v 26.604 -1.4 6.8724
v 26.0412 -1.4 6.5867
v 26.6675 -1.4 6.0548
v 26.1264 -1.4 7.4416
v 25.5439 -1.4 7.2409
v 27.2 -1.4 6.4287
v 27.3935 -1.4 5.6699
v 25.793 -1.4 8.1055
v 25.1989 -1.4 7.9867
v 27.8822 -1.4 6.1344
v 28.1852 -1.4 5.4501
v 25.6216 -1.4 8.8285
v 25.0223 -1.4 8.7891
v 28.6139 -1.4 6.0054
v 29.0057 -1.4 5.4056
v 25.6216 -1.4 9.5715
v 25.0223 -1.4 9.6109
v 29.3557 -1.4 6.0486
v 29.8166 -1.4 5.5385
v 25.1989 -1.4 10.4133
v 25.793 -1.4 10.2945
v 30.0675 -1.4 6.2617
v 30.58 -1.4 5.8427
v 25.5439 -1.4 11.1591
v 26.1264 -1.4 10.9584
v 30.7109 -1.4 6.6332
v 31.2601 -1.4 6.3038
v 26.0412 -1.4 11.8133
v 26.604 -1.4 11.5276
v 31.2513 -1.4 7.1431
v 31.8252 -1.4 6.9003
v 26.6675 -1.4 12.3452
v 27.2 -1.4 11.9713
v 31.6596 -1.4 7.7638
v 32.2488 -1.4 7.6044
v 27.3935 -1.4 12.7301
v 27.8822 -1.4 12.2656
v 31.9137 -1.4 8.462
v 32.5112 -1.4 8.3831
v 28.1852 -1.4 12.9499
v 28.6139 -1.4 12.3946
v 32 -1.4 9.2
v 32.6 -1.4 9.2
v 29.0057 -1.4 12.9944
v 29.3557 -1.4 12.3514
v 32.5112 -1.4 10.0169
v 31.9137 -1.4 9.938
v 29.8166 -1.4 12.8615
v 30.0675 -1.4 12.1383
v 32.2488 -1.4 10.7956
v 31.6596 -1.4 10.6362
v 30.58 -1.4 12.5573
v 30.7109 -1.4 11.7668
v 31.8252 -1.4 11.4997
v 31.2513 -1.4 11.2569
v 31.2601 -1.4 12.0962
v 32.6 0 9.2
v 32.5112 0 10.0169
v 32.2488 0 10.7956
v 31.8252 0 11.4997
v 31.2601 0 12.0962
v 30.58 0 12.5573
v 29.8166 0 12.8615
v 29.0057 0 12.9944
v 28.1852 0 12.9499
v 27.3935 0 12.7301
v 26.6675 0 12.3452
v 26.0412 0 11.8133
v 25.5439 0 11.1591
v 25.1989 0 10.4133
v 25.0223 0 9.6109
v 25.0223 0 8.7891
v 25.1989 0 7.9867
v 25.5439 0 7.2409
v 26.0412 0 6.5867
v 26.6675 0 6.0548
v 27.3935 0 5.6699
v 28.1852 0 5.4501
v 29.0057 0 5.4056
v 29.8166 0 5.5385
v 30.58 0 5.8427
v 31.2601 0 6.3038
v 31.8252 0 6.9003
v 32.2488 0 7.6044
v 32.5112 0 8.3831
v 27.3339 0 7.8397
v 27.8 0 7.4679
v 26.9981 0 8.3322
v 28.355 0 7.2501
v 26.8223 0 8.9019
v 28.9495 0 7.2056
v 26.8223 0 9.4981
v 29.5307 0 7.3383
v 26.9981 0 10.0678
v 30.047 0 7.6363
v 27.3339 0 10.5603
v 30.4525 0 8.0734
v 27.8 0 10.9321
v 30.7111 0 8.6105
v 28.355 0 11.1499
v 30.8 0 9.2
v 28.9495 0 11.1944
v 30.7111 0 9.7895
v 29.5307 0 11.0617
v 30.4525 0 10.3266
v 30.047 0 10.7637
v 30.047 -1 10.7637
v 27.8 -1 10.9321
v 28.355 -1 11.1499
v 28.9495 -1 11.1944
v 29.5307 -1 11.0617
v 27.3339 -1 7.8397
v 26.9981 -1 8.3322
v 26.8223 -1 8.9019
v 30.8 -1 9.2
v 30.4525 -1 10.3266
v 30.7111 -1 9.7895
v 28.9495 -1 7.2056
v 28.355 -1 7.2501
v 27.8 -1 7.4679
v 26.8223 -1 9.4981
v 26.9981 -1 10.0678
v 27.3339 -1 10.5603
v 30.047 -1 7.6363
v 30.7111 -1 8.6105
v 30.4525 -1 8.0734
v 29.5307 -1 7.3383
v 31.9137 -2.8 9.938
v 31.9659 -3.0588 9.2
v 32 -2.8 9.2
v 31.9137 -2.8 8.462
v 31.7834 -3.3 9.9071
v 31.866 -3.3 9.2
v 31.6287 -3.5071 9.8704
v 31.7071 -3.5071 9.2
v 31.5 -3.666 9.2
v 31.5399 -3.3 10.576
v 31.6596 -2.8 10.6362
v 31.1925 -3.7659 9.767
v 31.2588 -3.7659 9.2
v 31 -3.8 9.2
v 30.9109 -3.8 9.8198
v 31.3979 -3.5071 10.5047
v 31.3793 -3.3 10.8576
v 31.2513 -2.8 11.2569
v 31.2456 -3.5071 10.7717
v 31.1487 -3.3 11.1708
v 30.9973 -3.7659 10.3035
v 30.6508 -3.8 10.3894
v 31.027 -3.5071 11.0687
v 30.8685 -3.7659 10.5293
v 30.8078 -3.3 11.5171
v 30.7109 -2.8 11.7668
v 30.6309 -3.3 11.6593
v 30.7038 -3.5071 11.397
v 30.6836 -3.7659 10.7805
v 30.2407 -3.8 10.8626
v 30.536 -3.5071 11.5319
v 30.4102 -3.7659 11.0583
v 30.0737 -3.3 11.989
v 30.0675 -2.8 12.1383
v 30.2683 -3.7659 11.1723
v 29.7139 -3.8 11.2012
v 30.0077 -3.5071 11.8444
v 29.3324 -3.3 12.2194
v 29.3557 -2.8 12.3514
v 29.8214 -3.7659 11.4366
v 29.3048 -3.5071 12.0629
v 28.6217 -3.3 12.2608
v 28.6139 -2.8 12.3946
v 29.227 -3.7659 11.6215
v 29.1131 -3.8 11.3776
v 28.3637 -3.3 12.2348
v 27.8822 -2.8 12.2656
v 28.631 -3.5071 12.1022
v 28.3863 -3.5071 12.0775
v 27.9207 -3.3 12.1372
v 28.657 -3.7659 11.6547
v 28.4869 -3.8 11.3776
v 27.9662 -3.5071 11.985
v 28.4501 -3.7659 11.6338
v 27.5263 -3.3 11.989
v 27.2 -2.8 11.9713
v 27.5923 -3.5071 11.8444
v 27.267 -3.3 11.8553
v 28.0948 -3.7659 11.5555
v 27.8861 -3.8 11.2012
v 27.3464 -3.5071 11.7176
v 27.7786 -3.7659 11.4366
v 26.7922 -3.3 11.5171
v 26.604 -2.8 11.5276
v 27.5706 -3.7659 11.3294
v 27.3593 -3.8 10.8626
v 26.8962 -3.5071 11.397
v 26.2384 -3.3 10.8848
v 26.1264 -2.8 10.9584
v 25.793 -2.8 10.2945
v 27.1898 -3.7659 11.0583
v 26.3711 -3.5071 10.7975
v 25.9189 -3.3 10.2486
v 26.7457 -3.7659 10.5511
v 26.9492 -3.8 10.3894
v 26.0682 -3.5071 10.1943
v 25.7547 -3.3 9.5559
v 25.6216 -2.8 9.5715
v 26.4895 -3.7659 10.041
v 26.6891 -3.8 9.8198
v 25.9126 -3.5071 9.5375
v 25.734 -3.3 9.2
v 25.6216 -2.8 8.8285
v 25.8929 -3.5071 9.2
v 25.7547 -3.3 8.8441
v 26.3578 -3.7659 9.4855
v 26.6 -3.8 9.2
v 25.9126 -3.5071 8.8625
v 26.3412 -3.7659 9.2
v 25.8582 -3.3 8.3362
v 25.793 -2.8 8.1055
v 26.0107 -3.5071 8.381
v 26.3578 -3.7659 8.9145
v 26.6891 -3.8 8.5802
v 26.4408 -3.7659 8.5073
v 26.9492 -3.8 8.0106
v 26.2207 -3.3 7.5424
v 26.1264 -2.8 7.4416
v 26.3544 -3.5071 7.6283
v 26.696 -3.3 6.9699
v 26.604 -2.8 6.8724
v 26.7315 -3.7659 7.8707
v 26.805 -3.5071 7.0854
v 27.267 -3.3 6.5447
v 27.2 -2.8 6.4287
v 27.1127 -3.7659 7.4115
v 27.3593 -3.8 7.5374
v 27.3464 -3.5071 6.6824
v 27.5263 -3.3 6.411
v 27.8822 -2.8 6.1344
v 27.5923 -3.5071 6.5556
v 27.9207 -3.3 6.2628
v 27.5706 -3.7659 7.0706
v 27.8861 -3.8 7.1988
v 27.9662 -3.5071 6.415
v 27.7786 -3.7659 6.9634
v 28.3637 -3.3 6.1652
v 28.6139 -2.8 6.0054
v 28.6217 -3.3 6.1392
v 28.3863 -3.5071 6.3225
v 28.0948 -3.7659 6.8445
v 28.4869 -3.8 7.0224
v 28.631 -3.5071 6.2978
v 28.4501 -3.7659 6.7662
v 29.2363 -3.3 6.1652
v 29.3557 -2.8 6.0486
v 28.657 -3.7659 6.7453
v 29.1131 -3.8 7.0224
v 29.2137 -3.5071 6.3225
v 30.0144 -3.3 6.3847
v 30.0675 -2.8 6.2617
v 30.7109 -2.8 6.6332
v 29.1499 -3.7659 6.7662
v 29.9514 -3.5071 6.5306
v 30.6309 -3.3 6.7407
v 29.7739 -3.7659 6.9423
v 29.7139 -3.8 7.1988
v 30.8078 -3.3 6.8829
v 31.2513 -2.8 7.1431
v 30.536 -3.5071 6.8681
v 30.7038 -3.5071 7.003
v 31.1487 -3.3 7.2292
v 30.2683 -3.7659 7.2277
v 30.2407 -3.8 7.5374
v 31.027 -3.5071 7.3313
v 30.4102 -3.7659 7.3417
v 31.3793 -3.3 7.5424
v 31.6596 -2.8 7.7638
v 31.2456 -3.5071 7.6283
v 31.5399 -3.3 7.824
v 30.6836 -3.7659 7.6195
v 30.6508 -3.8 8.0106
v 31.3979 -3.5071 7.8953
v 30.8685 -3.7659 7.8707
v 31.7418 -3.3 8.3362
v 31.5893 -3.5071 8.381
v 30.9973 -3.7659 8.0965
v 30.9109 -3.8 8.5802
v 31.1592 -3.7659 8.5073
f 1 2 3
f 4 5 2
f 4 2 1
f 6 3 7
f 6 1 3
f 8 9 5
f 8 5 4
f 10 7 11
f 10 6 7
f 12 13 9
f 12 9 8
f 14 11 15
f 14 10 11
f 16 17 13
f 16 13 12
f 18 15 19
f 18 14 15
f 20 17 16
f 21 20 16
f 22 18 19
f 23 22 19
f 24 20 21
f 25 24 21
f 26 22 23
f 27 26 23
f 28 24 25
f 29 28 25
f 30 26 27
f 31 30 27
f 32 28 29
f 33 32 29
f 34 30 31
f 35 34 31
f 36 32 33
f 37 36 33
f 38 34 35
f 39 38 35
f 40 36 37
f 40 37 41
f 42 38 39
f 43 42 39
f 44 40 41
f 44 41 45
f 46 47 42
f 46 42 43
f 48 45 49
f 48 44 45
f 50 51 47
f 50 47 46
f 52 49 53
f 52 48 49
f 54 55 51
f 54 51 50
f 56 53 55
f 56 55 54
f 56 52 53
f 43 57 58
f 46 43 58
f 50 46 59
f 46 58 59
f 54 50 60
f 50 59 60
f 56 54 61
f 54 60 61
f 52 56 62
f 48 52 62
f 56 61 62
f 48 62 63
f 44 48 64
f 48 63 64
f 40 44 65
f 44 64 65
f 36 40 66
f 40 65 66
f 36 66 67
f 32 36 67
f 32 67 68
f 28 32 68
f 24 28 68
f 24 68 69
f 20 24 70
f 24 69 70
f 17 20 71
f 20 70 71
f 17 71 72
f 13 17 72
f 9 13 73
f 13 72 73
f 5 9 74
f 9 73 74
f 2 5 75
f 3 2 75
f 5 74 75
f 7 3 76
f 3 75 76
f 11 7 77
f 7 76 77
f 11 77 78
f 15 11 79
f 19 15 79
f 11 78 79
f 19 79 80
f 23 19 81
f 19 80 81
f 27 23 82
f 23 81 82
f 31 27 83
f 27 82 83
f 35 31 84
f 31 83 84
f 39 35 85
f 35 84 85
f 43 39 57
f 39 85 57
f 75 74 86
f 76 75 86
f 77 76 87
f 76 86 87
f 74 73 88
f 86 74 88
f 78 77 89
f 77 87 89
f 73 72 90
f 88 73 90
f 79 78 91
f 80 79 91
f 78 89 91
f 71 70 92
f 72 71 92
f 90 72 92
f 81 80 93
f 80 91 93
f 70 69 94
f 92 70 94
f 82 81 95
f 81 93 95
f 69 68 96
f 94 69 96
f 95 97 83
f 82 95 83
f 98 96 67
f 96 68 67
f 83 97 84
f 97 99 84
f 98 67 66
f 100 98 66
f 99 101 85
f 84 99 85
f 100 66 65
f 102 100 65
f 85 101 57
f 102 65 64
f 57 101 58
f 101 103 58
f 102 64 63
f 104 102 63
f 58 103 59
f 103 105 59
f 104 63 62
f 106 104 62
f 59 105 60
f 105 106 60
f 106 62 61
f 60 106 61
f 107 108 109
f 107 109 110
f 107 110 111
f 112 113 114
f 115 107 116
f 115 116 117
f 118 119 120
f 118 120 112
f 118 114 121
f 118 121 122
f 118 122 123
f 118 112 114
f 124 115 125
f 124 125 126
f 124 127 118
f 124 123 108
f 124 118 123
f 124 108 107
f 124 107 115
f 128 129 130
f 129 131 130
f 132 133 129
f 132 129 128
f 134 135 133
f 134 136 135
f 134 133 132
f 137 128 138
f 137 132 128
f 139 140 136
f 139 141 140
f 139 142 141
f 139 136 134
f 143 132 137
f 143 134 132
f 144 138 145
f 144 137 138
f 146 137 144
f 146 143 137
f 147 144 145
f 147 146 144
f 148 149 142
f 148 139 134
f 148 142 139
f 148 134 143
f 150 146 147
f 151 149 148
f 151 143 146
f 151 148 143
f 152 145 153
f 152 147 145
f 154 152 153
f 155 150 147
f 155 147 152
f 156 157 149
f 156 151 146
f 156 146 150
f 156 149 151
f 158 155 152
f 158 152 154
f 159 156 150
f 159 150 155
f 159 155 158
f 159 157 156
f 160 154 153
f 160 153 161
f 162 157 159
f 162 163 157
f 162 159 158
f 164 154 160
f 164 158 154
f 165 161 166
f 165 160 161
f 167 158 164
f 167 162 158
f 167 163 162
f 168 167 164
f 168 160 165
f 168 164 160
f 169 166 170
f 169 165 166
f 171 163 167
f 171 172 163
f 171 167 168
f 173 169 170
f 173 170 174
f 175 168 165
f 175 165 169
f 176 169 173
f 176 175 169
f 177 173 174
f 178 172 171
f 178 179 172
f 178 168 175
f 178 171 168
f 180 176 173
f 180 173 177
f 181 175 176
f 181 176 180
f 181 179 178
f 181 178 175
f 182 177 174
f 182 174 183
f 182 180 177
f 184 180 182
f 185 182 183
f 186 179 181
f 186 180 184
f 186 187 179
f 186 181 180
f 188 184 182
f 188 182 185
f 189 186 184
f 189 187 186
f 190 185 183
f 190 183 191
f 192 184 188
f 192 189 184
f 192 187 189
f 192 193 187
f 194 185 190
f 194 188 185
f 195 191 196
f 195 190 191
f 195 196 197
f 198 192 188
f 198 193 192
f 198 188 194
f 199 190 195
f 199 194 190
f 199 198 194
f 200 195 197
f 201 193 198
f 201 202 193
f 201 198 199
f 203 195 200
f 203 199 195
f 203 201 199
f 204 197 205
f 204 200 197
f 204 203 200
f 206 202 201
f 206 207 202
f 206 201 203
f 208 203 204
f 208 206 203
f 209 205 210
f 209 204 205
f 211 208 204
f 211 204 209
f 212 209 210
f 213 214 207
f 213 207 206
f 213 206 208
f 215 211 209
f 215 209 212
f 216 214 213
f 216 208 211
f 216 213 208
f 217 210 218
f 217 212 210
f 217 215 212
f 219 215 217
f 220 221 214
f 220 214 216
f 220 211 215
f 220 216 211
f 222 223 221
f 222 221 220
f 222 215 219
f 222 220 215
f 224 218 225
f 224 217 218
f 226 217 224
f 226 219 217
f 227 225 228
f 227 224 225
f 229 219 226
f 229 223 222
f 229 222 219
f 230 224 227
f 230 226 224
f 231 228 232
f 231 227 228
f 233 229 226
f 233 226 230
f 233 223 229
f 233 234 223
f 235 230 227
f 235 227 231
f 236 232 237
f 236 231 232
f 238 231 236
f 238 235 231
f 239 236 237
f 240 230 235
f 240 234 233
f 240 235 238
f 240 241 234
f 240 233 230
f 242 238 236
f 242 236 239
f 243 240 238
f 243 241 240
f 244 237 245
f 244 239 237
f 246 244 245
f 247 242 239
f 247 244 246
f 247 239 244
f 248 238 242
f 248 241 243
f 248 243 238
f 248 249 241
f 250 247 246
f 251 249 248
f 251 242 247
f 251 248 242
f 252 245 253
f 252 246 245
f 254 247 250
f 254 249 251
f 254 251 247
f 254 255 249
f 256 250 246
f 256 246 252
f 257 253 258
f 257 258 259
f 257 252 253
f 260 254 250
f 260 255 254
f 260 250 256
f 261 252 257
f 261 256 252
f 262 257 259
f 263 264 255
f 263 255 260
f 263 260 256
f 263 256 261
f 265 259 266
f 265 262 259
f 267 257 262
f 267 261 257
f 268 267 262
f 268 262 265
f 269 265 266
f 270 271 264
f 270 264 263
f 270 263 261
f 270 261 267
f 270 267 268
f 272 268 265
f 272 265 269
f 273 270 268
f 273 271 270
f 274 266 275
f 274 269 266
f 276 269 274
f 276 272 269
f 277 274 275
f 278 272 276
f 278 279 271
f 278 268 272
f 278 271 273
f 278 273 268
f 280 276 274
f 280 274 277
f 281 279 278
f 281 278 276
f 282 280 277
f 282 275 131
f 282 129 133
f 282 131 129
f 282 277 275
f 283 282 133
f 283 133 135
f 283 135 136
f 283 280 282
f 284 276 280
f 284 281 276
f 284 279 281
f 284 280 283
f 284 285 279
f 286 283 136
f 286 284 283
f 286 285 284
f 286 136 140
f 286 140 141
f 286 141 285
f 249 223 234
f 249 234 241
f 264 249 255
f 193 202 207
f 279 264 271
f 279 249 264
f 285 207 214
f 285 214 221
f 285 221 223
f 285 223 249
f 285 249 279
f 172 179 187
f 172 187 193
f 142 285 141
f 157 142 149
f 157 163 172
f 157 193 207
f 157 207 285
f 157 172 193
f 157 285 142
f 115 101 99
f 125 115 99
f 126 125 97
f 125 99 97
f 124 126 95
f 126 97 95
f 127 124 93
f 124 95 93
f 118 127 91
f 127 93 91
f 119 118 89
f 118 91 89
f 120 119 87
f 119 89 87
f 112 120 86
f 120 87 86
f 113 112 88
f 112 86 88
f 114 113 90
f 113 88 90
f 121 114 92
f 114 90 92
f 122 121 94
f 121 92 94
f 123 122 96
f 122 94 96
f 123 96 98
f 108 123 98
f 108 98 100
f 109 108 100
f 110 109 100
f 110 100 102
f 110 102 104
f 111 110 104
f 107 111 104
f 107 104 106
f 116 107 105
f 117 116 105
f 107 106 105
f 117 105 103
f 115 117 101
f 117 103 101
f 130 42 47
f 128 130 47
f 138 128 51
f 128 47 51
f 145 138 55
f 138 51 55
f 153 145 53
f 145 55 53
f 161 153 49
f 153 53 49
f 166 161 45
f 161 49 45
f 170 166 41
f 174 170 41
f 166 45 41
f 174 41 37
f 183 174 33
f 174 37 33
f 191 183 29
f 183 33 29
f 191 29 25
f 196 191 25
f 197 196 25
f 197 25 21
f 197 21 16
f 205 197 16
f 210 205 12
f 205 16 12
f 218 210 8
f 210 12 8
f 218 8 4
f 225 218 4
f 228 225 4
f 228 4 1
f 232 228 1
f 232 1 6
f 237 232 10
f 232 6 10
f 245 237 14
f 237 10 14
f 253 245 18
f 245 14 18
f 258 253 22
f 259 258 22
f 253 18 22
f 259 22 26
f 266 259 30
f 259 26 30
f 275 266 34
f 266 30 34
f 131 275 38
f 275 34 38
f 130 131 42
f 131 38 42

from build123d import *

# Parameters (mm, degrees)
SKETCH046_R     = 3.8
PAD020_DEPTH    = 1.4
SKETCH047_R     = 3.2
PAD021_DEPTH    = 2.4
SKETCH049_R     = 2
POCKET020_DEPTH = 1
FILLET018_R     = 1


with BuildPart() as part:
    # Sketch046 → Pad020 (new body)
    with BuildSketch(Plane.XZ):
        with Locations((28.8, 9.2)):
            Circle(SKETCH046_R)
    extrude(amount=PAD020_DEPTH)

    # Sketch047 (on Face3 of Pad020) → Pad021 (join)
    with BuildSketch(Plane.XZ.offset(1.4)):
        with Locations((28.8, 9.2)):
            Circle(SKETCH047_R)
    extrude(amount=PAD021_DEPTH)

    # Sketch049 (on Face2 of Pad021) → Pocket020 (cut)
    with BuildSketch(Plane(origin=(0, 0, 0), x_dir=(1, 0, 0), z_dir=(0, 1, 0))):
        with Locations((28.8, -9.2)):
            Circle(SKETCH049_R)
    extrude(amount=-POCKET020_DEPTH, mode=Mode.SUBTRACT)

    # Fillet018
    fillet018_edges = [part.edges().sort_by_distance(p)[0] for p in [
        (25.6, -3.8, 9.2),
    ]]
    fillet(fillet018_edges, radius=FILLET018_R)


solid = part.part
